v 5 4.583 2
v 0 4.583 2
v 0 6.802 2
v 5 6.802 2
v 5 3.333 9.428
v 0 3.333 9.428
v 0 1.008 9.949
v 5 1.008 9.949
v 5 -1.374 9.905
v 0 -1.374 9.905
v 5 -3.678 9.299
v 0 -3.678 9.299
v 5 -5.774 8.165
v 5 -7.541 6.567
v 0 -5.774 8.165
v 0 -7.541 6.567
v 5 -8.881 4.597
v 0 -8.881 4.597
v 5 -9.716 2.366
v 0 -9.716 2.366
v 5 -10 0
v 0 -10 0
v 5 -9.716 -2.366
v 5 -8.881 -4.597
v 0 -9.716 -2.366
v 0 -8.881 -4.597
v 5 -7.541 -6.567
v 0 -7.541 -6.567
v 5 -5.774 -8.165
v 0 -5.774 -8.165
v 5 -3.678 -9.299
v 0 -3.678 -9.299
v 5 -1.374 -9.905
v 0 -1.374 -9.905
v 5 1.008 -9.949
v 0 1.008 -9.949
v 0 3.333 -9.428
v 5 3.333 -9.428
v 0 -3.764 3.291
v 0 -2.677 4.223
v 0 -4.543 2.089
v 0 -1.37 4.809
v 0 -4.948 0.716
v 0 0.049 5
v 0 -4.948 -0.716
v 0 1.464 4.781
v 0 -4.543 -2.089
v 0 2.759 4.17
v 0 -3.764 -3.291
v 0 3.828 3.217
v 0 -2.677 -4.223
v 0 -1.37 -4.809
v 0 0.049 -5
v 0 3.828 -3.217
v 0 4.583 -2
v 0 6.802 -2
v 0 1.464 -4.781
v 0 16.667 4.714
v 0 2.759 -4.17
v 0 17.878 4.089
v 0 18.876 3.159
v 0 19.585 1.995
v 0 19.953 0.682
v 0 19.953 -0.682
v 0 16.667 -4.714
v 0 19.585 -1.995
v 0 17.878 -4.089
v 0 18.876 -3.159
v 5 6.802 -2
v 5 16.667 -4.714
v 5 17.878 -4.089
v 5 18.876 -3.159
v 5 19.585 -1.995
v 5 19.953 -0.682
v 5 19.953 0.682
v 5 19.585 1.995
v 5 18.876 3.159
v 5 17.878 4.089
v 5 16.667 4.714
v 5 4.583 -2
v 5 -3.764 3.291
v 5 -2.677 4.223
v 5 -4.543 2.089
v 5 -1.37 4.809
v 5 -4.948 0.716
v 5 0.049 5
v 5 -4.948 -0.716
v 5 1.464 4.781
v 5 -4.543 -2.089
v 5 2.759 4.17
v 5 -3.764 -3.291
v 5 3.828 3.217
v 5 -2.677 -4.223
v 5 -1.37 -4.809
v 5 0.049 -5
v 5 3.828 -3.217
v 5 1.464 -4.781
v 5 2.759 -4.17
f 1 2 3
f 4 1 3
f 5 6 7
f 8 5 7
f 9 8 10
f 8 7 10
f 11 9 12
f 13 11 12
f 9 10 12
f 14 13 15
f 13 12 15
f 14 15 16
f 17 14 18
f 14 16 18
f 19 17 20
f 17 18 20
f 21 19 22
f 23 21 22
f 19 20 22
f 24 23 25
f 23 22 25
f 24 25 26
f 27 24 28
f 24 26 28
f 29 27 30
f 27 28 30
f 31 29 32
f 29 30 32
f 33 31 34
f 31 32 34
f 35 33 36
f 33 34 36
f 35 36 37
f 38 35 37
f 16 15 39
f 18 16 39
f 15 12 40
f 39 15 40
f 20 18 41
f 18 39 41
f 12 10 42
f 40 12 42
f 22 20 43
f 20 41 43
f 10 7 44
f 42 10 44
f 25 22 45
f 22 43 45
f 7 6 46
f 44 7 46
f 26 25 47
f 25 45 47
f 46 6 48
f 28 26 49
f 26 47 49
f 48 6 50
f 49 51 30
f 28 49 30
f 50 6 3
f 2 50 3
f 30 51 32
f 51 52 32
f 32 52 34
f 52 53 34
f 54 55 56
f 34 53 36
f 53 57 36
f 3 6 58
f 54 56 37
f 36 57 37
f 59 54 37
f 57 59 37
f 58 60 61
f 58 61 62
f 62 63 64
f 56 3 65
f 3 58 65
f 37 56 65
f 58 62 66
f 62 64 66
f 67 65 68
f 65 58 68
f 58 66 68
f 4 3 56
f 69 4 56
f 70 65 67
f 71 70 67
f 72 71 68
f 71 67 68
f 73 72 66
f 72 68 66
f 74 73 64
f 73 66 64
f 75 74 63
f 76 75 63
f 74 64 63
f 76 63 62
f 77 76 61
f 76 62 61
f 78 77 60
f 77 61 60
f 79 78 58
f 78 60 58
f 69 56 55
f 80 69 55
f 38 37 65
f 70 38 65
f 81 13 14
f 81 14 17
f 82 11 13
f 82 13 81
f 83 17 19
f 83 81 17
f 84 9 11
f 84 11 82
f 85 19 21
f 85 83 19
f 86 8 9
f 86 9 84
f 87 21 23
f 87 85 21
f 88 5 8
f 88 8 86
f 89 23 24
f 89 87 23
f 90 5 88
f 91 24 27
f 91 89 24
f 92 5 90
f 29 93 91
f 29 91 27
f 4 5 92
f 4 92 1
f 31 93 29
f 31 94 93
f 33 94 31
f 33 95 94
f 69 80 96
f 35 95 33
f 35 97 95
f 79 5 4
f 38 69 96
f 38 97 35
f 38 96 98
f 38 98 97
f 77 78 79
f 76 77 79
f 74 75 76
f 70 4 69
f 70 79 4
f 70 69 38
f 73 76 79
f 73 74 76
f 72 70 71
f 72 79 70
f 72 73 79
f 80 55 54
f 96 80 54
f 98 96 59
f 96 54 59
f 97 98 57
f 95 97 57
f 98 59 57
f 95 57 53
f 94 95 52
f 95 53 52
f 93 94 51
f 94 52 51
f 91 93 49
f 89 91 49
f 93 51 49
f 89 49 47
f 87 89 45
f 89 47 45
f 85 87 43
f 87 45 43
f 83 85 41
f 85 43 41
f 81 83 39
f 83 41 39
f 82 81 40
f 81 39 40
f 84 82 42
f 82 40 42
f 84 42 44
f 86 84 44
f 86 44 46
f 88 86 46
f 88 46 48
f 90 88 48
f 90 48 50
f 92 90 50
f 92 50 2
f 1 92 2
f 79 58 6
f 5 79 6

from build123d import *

# Parameters (mm, degrees)
BOSS_EXTRUDE1_DEPTH = 5


with BuildPart() as part:
    # Sketch1 → Boss-Extrude1 (new body)
    with BuildSketch(Plane(origin=(0, 0, 0), x_dir=(0, 0, -1), z_dir=(1, 0, 0))):
        with BuildLine():
            ThreePointArc((4.714045208, 16.666666667), (0, 20), (-4.714045208, 16.666666667))
            Line((-4.714045208, 16.666666667), (-9.428090416, 3.333333333))
            ThreePointArc((-9.428090416, 3.333333333), (0, -10), (9.428090416, 3.333333333))
            Line((9.428090416, 3.333333333), (4.714045208, 16.666666667))
        make_face()
        with BuildLine():
            ThreePointArc((2, 4.582575695), (0, -5), (-2, 4.582575695))
            Line((-2, 4.582575695), (-2, 6.802065863))
            Line((-2, 6.802065863), (2, 6.802065863))
            Line((2, 6.802065863), (2, 4.582575695))
        make_face(mode=Mode.SUBTRACT)
    extrude(amount=BOSS_EXTRUDE1_DEPTH)


solid = part.part
